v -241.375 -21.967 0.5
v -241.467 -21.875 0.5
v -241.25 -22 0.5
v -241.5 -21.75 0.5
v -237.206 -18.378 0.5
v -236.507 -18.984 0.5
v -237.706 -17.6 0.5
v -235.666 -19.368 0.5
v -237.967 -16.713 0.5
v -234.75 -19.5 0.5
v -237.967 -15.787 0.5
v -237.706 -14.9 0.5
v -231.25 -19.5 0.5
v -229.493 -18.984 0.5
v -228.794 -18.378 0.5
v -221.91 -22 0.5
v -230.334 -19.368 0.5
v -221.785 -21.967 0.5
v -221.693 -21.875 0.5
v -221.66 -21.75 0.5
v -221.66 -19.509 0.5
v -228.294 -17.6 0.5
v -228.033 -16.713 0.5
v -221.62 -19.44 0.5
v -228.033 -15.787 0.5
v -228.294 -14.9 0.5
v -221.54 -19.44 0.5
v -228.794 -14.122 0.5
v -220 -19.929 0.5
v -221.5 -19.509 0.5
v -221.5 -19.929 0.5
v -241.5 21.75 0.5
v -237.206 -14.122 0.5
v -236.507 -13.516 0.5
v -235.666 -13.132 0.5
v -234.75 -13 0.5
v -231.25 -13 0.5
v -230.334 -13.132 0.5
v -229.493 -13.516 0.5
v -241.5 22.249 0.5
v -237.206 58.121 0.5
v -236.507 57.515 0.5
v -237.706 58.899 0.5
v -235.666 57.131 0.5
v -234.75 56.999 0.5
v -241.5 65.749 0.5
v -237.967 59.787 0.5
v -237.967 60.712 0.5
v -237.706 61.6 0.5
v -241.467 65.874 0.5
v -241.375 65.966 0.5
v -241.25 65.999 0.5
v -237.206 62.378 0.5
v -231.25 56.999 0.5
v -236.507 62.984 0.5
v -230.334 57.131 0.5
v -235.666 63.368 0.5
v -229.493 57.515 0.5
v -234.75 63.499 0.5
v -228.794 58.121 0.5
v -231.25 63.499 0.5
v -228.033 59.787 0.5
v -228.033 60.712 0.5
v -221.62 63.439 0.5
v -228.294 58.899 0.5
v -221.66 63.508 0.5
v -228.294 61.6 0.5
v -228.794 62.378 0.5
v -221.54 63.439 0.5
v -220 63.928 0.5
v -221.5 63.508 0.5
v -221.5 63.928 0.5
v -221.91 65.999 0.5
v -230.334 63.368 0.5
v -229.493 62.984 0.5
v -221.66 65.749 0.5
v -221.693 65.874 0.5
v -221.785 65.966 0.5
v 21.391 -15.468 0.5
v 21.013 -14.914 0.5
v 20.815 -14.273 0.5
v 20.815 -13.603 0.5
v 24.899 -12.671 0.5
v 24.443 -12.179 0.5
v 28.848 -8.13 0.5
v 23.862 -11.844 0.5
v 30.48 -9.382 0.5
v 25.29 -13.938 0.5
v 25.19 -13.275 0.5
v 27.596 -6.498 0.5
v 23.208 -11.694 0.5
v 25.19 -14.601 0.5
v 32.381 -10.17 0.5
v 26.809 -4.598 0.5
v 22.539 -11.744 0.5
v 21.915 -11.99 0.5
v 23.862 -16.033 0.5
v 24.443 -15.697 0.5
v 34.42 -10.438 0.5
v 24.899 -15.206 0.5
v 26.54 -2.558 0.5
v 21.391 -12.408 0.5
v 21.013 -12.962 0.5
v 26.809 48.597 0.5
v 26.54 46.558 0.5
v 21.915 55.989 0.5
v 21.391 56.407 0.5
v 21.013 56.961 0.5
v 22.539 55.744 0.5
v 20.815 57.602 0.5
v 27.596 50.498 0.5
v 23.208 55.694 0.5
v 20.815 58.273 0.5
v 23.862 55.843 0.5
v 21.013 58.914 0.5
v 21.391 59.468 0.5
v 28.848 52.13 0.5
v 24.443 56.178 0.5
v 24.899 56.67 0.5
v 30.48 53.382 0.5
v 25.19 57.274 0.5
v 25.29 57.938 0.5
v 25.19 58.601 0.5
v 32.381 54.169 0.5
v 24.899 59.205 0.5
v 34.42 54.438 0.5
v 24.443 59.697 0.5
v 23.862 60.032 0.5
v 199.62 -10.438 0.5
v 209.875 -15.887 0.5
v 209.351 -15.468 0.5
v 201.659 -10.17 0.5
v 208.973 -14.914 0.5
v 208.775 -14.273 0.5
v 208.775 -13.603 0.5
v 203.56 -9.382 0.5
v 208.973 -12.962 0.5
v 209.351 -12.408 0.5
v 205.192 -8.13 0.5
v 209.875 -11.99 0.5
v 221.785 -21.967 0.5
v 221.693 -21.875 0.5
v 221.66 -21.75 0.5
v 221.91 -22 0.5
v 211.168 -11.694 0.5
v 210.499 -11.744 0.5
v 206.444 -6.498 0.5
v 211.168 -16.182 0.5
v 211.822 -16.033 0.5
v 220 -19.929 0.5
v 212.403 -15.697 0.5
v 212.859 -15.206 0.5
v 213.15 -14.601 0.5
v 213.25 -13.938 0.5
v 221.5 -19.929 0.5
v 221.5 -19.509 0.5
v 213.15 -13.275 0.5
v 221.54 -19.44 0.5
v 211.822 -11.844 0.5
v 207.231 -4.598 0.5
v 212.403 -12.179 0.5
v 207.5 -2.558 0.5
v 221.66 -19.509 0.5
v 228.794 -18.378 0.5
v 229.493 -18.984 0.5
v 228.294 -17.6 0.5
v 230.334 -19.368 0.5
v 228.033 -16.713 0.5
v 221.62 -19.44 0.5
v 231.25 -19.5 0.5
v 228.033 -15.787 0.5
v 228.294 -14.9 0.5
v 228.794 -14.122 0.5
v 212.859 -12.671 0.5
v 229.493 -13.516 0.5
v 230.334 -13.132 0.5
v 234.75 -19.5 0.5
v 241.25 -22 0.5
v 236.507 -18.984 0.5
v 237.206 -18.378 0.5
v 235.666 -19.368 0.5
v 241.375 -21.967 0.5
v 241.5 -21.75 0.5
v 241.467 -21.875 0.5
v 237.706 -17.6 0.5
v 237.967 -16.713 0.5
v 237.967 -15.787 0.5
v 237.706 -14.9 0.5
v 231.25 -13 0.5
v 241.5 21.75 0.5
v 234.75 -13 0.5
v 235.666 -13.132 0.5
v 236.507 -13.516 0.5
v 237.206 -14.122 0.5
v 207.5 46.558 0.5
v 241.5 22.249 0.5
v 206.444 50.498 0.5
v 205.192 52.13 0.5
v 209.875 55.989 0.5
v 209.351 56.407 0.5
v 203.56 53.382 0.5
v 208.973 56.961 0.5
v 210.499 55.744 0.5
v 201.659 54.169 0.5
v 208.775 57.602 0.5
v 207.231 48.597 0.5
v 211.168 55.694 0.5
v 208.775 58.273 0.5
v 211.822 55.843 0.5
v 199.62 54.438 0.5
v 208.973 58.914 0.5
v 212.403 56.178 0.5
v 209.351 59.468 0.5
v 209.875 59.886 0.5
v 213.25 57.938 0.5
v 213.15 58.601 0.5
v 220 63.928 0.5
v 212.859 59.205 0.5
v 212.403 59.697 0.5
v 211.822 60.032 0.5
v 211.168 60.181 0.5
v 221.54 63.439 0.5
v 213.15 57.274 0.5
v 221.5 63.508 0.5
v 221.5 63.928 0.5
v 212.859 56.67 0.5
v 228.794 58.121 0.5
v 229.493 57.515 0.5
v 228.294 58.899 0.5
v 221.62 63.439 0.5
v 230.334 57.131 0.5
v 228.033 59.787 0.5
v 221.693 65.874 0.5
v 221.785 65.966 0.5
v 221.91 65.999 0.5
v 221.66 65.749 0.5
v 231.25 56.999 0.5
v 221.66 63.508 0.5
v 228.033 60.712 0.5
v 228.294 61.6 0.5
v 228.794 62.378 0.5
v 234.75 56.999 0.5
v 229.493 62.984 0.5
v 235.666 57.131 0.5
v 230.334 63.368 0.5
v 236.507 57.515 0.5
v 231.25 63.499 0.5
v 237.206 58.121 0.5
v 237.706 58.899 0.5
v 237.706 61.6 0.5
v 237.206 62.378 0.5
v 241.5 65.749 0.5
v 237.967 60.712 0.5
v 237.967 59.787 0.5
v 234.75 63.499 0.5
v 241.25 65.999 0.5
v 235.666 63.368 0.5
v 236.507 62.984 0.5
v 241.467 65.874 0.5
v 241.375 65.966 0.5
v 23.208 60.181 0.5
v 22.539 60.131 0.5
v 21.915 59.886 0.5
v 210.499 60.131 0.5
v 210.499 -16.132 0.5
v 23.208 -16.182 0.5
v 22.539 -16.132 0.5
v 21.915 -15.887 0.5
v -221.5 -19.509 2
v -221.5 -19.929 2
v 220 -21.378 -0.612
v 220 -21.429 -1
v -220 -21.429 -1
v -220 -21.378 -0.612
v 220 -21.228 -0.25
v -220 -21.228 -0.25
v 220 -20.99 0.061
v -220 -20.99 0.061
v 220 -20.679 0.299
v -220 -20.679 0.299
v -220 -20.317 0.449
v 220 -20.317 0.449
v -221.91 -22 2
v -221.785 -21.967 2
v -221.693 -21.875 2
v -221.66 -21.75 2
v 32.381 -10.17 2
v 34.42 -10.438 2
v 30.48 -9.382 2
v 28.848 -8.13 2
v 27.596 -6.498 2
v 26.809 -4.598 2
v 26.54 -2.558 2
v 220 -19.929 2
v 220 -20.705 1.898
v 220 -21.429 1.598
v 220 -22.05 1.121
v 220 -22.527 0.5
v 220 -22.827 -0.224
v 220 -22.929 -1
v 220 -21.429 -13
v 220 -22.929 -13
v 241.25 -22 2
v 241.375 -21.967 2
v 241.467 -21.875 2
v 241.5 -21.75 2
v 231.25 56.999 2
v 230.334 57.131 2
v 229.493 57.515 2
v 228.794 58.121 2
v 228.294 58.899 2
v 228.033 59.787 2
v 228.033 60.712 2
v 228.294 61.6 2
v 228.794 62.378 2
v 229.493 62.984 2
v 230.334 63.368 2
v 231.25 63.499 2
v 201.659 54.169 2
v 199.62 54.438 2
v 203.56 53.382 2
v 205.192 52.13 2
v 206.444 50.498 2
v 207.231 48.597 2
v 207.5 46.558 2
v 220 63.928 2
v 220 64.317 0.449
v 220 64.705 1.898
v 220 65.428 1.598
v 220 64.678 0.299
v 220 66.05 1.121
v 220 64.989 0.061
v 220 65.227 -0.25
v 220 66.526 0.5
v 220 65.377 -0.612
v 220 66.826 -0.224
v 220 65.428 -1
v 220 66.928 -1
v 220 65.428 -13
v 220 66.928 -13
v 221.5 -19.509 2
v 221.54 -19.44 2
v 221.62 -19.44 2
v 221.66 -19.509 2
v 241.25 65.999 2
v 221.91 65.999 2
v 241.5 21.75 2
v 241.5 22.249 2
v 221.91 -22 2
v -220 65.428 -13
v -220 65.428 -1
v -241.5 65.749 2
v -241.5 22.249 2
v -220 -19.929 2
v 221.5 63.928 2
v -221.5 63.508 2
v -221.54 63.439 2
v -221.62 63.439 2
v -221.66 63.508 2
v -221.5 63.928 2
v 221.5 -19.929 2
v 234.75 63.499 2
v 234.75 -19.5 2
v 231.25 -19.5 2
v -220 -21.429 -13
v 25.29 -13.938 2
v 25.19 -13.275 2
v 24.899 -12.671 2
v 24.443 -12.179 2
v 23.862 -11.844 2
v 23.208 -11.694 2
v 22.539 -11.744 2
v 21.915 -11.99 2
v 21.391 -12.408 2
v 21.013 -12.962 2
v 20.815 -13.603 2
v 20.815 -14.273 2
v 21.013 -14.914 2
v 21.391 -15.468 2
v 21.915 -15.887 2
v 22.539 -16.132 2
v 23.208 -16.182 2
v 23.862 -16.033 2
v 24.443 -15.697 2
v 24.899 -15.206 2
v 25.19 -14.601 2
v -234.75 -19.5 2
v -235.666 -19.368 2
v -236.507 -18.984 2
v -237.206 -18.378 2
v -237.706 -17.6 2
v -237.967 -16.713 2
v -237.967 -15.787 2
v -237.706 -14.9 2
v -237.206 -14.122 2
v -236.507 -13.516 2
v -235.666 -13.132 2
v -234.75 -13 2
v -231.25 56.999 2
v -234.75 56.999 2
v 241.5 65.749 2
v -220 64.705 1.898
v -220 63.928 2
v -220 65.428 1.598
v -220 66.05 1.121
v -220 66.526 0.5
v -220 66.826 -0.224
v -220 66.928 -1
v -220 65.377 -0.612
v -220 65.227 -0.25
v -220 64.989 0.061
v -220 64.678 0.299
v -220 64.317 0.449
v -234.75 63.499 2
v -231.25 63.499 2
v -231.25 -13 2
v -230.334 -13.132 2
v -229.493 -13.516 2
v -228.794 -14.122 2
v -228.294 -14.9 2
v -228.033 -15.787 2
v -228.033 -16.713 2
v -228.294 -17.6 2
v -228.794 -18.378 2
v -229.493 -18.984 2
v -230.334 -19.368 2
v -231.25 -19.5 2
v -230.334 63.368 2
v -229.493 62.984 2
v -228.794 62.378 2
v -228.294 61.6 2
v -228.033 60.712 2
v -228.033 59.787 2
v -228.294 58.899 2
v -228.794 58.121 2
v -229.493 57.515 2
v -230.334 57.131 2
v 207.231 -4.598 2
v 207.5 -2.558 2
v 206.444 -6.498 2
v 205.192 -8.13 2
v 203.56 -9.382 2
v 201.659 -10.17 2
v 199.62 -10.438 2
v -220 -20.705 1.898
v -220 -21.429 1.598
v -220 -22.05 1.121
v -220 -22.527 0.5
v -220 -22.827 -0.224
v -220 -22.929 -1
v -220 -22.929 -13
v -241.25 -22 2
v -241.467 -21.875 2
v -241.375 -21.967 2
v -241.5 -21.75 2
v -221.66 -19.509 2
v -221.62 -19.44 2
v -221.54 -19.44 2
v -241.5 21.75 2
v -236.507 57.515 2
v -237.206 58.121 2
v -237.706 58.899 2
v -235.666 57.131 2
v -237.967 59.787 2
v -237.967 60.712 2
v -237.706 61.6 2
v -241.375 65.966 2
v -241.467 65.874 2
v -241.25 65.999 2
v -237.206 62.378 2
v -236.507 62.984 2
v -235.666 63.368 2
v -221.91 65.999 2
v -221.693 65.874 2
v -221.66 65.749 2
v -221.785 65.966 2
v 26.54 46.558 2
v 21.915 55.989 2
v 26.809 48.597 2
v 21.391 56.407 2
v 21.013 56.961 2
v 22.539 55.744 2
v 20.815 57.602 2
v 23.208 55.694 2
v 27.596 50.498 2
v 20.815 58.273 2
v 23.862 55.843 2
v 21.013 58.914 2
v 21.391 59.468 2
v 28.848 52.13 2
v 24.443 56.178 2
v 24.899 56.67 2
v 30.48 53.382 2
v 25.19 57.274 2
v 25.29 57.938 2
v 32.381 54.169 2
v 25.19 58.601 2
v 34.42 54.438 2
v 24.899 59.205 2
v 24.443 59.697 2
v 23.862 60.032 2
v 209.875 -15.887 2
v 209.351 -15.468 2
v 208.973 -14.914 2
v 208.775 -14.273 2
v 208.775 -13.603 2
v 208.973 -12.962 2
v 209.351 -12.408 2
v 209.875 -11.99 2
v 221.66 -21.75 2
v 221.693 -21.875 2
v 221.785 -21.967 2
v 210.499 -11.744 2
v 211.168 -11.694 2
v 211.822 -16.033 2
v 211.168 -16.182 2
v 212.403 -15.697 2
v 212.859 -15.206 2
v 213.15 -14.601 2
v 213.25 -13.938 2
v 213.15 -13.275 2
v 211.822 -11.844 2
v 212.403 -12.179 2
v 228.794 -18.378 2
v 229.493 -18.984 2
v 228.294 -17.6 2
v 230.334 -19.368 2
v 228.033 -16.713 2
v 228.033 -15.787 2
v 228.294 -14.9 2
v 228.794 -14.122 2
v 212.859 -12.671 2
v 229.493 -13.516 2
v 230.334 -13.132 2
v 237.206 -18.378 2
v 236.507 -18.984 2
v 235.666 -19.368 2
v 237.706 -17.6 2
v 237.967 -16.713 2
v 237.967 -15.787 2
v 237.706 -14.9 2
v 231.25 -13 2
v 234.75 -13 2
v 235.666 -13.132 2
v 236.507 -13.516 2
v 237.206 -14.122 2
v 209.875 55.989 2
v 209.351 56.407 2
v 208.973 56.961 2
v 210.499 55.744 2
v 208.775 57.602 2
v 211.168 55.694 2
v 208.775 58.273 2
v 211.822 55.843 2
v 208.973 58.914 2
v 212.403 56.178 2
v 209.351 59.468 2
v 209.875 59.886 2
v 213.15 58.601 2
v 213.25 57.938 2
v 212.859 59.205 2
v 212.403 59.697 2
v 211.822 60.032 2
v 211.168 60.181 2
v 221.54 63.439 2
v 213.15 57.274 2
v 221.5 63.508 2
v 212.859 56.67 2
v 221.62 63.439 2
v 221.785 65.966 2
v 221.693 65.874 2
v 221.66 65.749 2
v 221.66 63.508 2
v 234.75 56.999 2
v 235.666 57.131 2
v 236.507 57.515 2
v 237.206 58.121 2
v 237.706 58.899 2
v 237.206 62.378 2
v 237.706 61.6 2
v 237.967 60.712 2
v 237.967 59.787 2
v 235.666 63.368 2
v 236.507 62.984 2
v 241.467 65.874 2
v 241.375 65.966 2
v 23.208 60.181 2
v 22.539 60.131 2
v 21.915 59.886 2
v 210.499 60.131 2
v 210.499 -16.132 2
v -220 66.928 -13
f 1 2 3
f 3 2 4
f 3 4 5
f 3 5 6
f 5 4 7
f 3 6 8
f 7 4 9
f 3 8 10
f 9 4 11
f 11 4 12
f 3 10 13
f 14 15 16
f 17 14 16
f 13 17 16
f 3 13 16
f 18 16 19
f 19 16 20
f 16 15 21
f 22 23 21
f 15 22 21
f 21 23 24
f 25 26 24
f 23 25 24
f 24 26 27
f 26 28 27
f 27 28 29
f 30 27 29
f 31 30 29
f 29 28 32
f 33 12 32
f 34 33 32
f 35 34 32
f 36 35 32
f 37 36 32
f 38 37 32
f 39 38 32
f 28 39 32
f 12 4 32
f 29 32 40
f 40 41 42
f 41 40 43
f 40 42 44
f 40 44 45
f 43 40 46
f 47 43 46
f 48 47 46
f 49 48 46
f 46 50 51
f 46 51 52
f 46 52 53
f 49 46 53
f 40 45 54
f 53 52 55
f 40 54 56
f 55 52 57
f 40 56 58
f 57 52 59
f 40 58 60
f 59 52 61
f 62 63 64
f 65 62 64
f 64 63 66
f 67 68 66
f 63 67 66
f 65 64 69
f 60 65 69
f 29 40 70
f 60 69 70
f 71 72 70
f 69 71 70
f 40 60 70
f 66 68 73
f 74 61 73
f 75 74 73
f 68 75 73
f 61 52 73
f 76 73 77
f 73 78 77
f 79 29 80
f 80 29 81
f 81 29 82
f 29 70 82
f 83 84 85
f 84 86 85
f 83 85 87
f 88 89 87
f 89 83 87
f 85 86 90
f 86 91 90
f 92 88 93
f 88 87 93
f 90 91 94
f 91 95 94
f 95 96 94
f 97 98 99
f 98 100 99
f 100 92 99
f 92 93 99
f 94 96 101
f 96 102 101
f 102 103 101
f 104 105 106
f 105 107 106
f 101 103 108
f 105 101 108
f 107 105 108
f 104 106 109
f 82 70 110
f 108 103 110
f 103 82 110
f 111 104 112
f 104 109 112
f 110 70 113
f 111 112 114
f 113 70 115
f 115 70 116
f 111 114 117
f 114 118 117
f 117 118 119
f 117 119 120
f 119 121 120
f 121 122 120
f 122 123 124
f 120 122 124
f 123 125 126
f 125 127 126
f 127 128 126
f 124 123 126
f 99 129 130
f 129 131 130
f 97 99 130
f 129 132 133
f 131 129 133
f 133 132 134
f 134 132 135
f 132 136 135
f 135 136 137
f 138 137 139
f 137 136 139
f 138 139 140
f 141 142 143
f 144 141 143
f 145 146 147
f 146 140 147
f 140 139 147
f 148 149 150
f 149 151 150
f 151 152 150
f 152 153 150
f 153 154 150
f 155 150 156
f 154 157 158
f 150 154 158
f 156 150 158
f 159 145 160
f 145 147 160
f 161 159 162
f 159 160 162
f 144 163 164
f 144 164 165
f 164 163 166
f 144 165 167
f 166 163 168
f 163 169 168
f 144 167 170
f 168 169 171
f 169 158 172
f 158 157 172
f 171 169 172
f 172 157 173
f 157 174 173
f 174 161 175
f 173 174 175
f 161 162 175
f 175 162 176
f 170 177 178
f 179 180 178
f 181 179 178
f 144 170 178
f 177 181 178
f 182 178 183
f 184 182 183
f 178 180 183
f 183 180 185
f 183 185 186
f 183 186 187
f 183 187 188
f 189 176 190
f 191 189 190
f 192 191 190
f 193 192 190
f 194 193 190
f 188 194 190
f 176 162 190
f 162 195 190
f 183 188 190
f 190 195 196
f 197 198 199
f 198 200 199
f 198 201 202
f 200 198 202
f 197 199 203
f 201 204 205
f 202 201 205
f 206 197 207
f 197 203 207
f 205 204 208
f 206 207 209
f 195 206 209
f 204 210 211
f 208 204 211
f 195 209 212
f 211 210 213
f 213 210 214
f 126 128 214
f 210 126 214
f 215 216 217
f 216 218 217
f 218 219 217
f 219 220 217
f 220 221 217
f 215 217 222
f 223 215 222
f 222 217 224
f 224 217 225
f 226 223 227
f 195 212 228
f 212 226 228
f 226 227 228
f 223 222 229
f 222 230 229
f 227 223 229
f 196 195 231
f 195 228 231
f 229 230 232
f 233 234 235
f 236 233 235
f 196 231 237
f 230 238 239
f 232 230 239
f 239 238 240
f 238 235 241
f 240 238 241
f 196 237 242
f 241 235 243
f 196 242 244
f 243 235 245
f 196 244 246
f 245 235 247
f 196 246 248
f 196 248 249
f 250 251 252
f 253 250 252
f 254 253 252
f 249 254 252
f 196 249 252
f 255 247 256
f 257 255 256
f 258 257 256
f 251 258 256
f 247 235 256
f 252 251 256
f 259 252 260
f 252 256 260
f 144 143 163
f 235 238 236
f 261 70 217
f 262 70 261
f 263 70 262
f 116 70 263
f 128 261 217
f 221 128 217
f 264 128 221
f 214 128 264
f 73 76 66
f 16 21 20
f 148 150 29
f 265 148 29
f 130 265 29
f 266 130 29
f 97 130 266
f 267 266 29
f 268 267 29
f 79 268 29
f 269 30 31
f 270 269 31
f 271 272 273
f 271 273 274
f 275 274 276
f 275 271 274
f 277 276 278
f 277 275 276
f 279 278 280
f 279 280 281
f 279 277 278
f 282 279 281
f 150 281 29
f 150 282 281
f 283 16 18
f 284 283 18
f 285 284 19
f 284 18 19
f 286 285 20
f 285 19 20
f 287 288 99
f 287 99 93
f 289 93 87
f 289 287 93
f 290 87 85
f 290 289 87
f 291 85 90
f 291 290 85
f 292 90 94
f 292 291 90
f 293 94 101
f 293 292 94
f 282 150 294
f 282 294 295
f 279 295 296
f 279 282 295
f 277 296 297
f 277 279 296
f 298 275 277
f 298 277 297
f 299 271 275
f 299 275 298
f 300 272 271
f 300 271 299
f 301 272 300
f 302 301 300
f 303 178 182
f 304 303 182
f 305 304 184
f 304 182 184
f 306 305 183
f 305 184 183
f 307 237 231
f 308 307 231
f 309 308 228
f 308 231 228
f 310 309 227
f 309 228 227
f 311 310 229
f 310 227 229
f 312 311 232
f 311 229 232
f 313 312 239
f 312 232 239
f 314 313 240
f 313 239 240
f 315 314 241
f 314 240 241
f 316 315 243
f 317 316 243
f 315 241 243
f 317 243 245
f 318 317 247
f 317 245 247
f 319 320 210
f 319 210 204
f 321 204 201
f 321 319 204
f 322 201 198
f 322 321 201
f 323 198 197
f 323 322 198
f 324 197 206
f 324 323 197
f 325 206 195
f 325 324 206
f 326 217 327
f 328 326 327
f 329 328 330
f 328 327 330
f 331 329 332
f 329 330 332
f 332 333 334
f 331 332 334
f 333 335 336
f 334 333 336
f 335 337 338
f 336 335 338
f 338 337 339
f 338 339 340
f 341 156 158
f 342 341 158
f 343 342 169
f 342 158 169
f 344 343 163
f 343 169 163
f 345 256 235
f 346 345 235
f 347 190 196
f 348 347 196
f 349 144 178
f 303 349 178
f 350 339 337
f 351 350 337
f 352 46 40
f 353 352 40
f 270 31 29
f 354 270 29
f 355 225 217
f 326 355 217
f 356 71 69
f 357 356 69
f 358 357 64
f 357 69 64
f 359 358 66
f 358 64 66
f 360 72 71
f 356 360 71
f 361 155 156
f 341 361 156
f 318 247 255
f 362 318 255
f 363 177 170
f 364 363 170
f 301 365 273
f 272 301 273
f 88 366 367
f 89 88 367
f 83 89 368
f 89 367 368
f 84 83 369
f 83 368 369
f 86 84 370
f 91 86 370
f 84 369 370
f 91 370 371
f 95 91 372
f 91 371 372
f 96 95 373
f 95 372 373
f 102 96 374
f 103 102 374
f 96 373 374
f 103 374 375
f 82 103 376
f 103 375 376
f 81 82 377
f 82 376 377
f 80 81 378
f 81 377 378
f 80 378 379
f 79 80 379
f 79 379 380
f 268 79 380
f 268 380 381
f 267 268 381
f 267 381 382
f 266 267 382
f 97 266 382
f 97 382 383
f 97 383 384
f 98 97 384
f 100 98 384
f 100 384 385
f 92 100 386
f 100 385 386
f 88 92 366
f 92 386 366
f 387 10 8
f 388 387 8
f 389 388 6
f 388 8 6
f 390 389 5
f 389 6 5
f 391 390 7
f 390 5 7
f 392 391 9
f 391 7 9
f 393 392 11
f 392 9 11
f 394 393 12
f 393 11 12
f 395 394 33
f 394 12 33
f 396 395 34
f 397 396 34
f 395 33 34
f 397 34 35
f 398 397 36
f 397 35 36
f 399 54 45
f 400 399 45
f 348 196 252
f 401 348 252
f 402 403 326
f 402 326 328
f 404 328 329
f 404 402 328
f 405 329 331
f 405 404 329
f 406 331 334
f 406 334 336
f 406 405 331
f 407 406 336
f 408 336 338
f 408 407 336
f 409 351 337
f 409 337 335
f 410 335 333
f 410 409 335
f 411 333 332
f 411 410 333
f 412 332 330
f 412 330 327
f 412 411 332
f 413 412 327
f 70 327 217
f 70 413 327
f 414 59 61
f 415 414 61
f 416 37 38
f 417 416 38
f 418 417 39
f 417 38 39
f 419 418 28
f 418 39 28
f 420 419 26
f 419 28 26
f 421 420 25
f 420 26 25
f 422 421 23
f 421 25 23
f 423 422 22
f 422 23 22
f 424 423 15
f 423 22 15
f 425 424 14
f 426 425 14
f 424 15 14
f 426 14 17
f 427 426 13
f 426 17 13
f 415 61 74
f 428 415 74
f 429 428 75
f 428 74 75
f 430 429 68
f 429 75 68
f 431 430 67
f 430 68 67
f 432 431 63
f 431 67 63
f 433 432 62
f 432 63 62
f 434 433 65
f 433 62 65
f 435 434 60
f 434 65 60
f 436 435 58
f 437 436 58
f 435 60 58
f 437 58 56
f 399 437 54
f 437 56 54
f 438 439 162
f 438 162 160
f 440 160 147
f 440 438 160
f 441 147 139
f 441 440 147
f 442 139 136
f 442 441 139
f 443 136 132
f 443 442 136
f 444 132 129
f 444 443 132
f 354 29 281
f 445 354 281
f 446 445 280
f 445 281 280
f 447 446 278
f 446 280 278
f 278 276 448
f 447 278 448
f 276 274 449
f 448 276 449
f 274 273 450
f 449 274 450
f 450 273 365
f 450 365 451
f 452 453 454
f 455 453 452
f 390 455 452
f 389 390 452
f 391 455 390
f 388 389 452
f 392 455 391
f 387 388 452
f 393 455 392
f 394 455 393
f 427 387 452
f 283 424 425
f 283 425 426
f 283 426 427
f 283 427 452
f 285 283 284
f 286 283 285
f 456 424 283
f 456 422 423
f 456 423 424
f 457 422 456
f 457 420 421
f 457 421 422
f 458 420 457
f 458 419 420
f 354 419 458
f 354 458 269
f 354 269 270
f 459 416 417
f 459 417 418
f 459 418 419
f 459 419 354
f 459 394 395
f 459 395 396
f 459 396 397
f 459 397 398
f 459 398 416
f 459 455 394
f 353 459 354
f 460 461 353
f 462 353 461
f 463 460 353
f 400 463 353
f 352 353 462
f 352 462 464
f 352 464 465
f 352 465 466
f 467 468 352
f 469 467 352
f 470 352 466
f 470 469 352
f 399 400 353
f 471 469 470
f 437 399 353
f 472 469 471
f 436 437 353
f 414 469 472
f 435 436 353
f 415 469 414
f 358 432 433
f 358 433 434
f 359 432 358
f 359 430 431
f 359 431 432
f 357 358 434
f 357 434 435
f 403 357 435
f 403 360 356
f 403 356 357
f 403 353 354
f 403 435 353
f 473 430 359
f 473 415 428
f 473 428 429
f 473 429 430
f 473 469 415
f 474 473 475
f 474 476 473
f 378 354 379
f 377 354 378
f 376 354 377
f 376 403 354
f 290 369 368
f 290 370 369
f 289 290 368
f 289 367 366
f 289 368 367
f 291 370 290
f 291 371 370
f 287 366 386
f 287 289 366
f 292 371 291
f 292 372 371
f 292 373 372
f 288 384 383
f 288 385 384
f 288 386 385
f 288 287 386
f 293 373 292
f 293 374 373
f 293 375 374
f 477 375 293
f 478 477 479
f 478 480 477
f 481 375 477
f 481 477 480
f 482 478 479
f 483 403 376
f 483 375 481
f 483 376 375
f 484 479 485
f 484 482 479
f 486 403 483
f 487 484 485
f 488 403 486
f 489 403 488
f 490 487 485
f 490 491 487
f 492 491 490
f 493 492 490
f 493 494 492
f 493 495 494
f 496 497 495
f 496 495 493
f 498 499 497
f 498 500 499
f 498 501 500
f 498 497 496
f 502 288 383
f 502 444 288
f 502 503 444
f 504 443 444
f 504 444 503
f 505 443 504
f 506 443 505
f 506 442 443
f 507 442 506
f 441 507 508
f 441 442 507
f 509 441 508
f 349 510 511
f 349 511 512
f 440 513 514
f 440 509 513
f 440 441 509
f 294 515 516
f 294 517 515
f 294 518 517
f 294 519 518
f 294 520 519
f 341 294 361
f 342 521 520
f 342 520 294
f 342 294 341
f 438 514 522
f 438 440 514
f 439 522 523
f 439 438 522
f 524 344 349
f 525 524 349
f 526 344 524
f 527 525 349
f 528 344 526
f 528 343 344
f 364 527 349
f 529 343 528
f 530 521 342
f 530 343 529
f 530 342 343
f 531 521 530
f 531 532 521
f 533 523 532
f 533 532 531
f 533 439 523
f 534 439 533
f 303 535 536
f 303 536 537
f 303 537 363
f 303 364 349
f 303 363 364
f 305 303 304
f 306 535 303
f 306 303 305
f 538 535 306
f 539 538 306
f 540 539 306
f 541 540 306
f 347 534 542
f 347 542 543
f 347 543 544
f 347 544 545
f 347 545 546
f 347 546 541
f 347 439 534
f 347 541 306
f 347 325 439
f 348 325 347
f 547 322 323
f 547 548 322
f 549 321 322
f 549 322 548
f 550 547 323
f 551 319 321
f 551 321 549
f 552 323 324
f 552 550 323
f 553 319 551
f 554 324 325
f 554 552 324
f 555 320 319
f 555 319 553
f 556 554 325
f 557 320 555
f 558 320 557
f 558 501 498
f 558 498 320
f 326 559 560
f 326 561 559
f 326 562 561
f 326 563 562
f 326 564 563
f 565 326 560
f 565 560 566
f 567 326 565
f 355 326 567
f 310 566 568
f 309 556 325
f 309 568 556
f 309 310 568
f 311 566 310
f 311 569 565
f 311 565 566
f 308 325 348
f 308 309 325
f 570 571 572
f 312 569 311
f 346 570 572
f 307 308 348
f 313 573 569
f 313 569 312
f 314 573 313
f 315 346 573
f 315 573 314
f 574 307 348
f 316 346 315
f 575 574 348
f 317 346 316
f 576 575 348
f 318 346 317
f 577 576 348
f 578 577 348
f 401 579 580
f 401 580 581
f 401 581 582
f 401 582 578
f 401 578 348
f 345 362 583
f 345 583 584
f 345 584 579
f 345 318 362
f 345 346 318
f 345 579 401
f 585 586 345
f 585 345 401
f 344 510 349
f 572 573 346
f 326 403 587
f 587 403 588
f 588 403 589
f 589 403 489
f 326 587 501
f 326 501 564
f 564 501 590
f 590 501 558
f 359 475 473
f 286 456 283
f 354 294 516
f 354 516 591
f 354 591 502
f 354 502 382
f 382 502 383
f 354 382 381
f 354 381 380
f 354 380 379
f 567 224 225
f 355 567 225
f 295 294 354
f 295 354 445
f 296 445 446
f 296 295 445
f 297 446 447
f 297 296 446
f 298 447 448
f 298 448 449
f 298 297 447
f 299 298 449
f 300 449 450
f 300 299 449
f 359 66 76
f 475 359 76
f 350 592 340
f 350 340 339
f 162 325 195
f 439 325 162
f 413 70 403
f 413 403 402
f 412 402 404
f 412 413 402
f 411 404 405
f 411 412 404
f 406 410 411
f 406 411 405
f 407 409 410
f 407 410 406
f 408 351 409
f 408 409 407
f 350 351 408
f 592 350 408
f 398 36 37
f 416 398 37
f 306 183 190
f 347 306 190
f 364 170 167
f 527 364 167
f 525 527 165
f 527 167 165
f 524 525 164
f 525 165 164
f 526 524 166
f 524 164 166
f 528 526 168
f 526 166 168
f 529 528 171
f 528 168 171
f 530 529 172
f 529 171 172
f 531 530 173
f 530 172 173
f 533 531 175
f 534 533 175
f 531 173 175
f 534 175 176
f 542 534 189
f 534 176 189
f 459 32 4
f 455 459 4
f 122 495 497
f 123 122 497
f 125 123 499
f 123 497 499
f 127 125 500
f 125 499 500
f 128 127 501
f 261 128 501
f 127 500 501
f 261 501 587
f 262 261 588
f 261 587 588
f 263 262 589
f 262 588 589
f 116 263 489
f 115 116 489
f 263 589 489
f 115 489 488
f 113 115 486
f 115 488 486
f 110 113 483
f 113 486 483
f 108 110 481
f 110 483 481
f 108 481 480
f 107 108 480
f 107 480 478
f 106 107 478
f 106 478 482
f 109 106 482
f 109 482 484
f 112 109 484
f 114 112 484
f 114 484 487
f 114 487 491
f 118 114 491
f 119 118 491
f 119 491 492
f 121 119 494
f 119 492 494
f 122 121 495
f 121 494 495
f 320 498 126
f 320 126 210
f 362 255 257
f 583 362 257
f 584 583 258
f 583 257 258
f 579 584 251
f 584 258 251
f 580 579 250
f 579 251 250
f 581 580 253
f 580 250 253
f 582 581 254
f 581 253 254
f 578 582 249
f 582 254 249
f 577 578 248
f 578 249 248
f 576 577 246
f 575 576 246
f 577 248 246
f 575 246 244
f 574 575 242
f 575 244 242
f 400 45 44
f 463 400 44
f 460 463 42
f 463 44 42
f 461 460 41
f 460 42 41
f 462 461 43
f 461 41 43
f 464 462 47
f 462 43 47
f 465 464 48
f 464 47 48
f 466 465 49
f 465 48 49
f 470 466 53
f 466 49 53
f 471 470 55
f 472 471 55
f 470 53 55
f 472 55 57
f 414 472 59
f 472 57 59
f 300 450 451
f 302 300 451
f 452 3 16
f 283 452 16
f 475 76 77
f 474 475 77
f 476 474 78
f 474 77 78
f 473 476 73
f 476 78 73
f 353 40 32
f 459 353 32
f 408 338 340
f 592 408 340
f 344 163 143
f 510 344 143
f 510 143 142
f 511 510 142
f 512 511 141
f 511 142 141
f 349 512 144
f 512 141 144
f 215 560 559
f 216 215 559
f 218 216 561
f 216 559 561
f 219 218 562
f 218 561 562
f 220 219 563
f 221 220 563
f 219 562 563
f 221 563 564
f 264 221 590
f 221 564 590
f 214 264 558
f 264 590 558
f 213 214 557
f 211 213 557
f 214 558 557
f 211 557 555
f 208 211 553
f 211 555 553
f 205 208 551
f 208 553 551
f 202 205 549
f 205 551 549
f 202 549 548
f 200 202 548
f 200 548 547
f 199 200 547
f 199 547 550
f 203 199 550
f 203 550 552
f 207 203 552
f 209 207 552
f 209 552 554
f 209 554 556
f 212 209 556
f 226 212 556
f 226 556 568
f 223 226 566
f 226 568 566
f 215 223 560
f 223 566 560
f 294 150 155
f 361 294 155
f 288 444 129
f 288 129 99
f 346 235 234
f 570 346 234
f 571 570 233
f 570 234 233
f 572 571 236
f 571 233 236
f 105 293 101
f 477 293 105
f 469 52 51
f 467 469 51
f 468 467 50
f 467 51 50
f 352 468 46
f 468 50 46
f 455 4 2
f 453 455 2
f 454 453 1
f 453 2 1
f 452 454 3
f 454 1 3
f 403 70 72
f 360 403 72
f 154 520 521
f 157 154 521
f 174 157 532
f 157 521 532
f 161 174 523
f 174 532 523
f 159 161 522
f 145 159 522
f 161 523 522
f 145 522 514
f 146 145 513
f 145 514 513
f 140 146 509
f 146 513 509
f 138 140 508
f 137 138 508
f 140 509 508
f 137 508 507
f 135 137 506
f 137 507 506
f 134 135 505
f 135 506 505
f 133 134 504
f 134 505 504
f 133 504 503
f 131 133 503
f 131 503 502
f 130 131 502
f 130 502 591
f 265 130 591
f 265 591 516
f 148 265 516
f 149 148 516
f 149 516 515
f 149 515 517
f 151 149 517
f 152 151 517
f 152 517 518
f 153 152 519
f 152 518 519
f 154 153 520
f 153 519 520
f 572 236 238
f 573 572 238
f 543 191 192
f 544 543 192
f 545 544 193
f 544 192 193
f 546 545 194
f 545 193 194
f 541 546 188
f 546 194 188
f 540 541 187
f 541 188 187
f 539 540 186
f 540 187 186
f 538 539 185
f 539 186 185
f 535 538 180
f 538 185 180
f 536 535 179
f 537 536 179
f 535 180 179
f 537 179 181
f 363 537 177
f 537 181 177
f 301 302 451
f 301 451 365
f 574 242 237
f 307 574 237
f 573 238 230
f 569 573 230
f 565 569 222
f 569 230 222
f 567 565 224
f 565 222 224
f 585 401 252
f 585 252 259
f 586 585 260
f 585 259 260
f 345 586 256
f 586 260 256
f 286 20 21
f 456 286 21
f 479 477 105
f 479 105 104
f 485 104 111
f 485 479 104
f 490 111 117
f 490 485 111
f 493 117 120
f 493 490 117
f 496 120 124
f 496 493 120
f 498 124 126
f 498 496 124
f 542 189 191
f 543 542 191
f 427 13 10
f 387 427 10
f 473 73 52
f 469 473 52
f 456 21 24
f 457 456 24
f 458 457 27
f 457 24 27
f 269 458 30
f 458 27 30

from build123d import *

# Parameters (mm, degrees)
BOSS_EXTRUDE1_DEPTH     = 2
CONVERT_SOLID1_DEPTH    = 0.5
EDGE_FLANGE1_DEPTH      = 440
EDGE_FLANGE1_BEND_DEPTH = 440
SKETCH12_R              = 2.25
CUT_EXTRUDE1_DEPTH      = 1.5


# Read off the part's stored shape, not the designer's step: Convert-Solid1
# Sheet-metal steps are written as plain solids
with BuildPart() as part:
    # Model → Boss-Extrude1 (new body)
    with BuildSketch(Plane.XY):
        with BuildLine():
            Line((221.66, -19.508939372), (221.66, -21.75))
            ThreePointArc((221.66, -21.75), (221.733223305, -21.926776695), (221.91, -22))
            Line((221.91, -22), (241.25, -22))
            ThreePointArc((241.25, -22), (241.426776695, -21.926776695), (241.5, -21.75))
            Line((241.5, -21.75), (241.5, 21.75))
            Line((241.5, 21.75), (241.500000169, 22.249478564))
            Line((241.500000169, 22.249478564), (241.500000169, 65.749478564))
            ThreePointArc((241.500000169, 65.749478564), (241.426776865, 65.926255259), (241.250000169, 65.999478564))
            Line((241.250000169, 65.999478564), (221.910000169, 65.999478564))
            ThreePointArc((221.910000169, 65.999478564), (221.733223474, 65.926255259), (221.660000169, 65.749478564))
            Line((221.660000169, 65.749478564), (221.660000169, 63.508417937))
            ThreePointArc((221.660000169, 63.508417937), (221.580000169, 63.428417937), (221.500000169, 63.508417937))
            Line((221.500000169, 63.508417937), (221.500000169, 63.928417937))
            Line((221.500000169, 63.928417937), (-221.499999831, 63.928417937))
            Line((-221.499999831, 63.928417937), (-221.499999831, 63.508417937))
            ThreePointArc((-221.499999831, 63.508417937), (-221.579999831, 63.428417937), (-221.659999831, 63.508417937))
            Line((-221.659999831, 63.508417937), (-221.659999831, 65.749478564))
            ThreePointArc((-221.659999831, 65.749478564), (-221.733223135, 65.926255259), (-221.909999831, 65.999478564))
            Line((-221.909999831, 65.999478564), (-241.249999831, 65.999478564))
            ThreePointArc((-241.249999831, 65.999478564), (-241.426776526, 65.926255259), (-241.499999831, 65.749478564))
            Line((-241.499999831, 65.749478564), (-241.499999831, 22.249478564))
            Line((-241.499999831, 22.249478564), (-241.5, 21.75))
            Line((-241.5, 21.75), (-241.5, -21.75))
            ThreePointArc((-241.5, -21.75), (-241.426776695, -21.926776695), (-241.25, -22))
            Line((-241.25, -22), (-221.91, -22))
            ThreePointArc((-221.91, -22), (-221.733223305, -21.926776695), (-221.66, -21.75))
            Line((-221.66, -21.75), (-221.66, -19.508939372))
            ThreePointArc((-221.66, -19.508939372), (-221.58, -19.428939372), (-221.5, -19.508939372))
            Line((-221.5, -19.508939372), (-221.5, -19.928939372))
            Line((-221.5, -19.928939372), (221.5, -19.928939372))
            Line((221.5, -19.928939372), (221.5, -19.508939372))
            ThreePointArc((221.5, -19.508939372), (221.58, -19.428939372), (221.66, -19.508939372))
        make_face()
        with BuildLine():
            Line((-231.25, -19.5), (-234.75, -19.5))
            ThreePointArc((-234.75, -19.5), (-238, -16.25), (-234.75, -13))
            Line((-234.75, -13), (-231.25, -13))
            ThreePointArc((-231.25, -13), (-228, -16.25), (-231.25, -19.5))
        make_face(mode=Mode.SUBTRACT)
        with BuildLine():
            Line((231.25, -13), (234.75, -13))
            ThreePointArc((234.75, -13), (238, -16.25), (234.75, -19.5))
            Line((234.75, -19.5), (231.25, -19.5))
            ThreePointArc((231.25, -19.5), (228, -16.25), (231.25, -13))
        make_face(mode=Mode.SUBTRACT)
        with BuildLine():
            Line((-231.249999831, 56.999478564), (-234.749999831, 56.999478564))
            ThreePointArc((-234.749999831, 56.999478564), (-237.999999831, 60.249478564), (-234.749999831, 63.499478564))
            Line((-234.749999831, 63.499478564), (-231.249999831, 63.499478564))
            ThreePointArc((-231.249999831, 63.499478564), (-227.999999831, 60.249478564), (-231.249999831, 56.999478564))
        make_face(mode=Mode.SUBTRACT)
        with BuildLine():
            Line((234.750000169, 56.999478564), (231.250000169, 56.999478564))
            ThreePointArc((231.250000169, 56.999478564), (228.000000169, 60.249478564), (231.250000169, 63.499478564))
            Line((231.250000169, 63.499478564), (234.750000169, 63.499478564))
            ThreePointArc((234.750000169, 63.499478564), (238.000000169, 60.249478564), (234.750000169, 56.999478564))
        make_face(mode=Mode.SUBTRACT)
    extrude(amount=BOSS_EXTRUDE1_DEPTH)

    # Convert-Solid1 outline → Convert-Solid1 (cut)
    with BuildSketch(Plane.XY):
        with BuildLine():
            Line((221.5, -19.928939372), (221.5, -19.508939372))
            ThreePointArc((221.5, -19.508939372), (221.58, -19.428939372), (221.66, -19.508939372))
            Line((221.66, -19.508939372), (221.66, -21.75))
            ThreePointArc((221.66, -21.75), (221.733223305, -21.926776695), (221.91, -22))
            Line((221.91, -22), (241.25, -22))
            ThreePointArc((241.25, -22), (241.426776695, -21.926776695), (241.5, -21.75))
            Line((241.5, -21.75), (241.5, 21.75))
            Line((241.5, 21.75), (241.500000169, 65.749478564))
            ThreePointArc((241.500000169, 65.749478564), (241.426776864, 65.926255259), (241.250000169, 65.999478564))
            Line((241.250000169, 65.999478564), (221.910000169, 65.999478564))
            ThreePointArc((221.910000169, 65.999478564), (221.733223474, 65.926255259), (221.660000169, 65.749478564))
            Line((221.660000169, 65.749478564), (221.660000169, 63.508417937))
            ThreePointArc((221.660000169, 63.508417937), (221.580000169, 63.428417937), (221.500000169, 63.508417937))
            Line((221.500000169, 63.508417937), (221.500000169, 63.928417937))
            Line((221.500000169, 63.928417937), (-221.499999831, 63.928417937))
            Line((-221.499999831, 63.928417937), (-221.499999831, 63.508417937))
            ThreePointArc((-221.499999831, 63.508417937), (-221.579999831, 63.428417937), (-221.659999831, 63.508417937))
            Line((-221.659999831, 63.508417937), (-221.659999831, 65.749478564))
            ThreePointArc((-221.659999831, 65.749478564), (-221.733223135, 65.926255259), (-221.909999831, 65.999478564))
            Line((-221.909999831, 65.999478564), (-241.249999831, 65.999478564))
            ThreePointArc((-241.249999831, 65.999478564), (-241.426776526, 65.926255259), (-241.499999831, 65.749478564))
            Line((-241.499999831, 65.749478564), (-241.499999831, 22.249478564))
            Line((-241.499999831, 22.249478564), (-241.5, -21.75))
            ThreePointArc((-241.5, -21.75), (-241.426776695, -21.926776695), (-241.25, -22))
            Line((-241.25, -22), (-221.91, -22))
            ThreePointArc((-221.91, -22), (-221.733223305, -21.926776695), (-221.66, -21.75))
            Line((-221.66, -21.75), (-221.66, -19.508939372))
            ThreePointArc((-221.66, -19.508939372), (-221.58, -19.428939372), (-221.5, -19.508939372))
            Line((-221.5, -19.508939372), (-221.5, -19.928939372))
            Line((-221.5, -19.928939372), (221.5, -19.928939372))
        make_face()
        with BuildLine():
            Line((-234.75, -13), (-231.25, -13))
            ThreePointArc((-231.25, -13), (-228, -16.25), (-231.25, -19.5))
            Line((-231.25, -19.5), (-234.75, -19.5))
            ThreePointArc((-234.75, -19.5), (-238, -16.25), (-234.75, -13))
        make_face(mode=Mode.SUBTRACT)
        with BuildLine():
            ThreePointArc((231.25, -19.5), (228, -16.25), (231.25, -13))
            Line((231.25, -13), (234.75, -13))
            ThreePointArc((234.75, -13), (238, -16.25), (234.75, -19.5))
            Line((234.75, -19.5), (231.25, -19.5))
        make_face(mode=Mode.SUBTRACT)
        with BuildLine():
            Line((-234.749999831, 63.499478564), (-231.249999831, 63.499478564))
            ThreePointArc((-231.249999831, 63.499478564), (-227.999999831, 60.249478564), (-231.249999831, 56.999478564))
            Line((-231.249999831, 56.999478564), (-234.749999831, 56.999478564))
            ThreePointArc((-234.749999831, 56.999478564), (-237.999999831, 60.249478564), (-234.749999831, 63.499478564))
        make_face(mode=Mode.SUBTRACT)
        with BuildLine():
            ThreePointArc((231.250000169, 56.999478564), (228.000000169, 60.249478564), (231.250000169, 63.499478564))
            Line((231.250000169, 63.499478564), (234.750000169, 63.499478564))
            ThreePointArc((234.750000169, 63.499478564), (238.000000169, 60.249478564), (234.750000169, 56.999478564))
            Line((234.750000169, 56.999478564), (231.250000169, 56.999478564))
        make_face(mode=Mode.SUBTRACT)
    extrude(amount=CONVERT_SOLID1_DEPTH, mode=Mode.SUBTRACT)

    # Edge-Flange1 section (across the edge) → Edge-Flange1 (add)
    with BuildSketch(Plane(origin=(-219.999999831, 65.428417937, 0.5), x_dir=(0, -1, 0), z_dir=(1, 0, 0))):
        with BuildLine():
            Line((-1.5, 1.5), (-1.5, 13.5))
            Line((-1.5, 13.5), (0, 13.5))
            Line((0, 13.5), (0, 1.5))
            ThreePointArc((0, 1.5), (0.439339828, 0.439339828), (1.5, 0))
            Line((1.5, 0), (1.5, -1.5))
            ThreePointArc((1.5, -1.5), (-0.621320344, -0.621320344), (-1.5, 1.5))
        make_face()
    extrude(amount=EDGE_FLANGE1_DEPTH)

    # Edge-Flange1 section 2 (across the edge) → Edge-Flange1 bend (add)
    with BuildSketch(Plane(origin=(220, -21.428939372, 0.5), x_dir=(0, 1, 0), z_dir=(-1, 0, 0))):
        with BuildLine():
            Line((-1.5, 1.5), (-1.5, 13.5))
            Line((-1.5, 13.5), (0, 13.5))
            Line((0, 13.5), (0, 1.5))
            ThreePointArc((0, 1.5), (0.439339828, 0.439339828), (1.5, 0))
            Line((1.5, 0), (1.5, -1.5))
            ThreePointArc((1.5, -1.5), (-0.621320344, -0.621320344), (-1.5, 1.5))
        make_face()
    extrude(amount=EDGE_FLANGE1_BEND_DEPTH)

    # Sketch12 → Cut-Extrude1 (cut)
    with BuildSketch(Plane.XY.offset(2)):
        with Locations((211.000000169, 57.937539282)):
            Circle(SKETCH12_R)
        with Locations((23.040000169, 57.937539282)):
            Circle(SKETCH12_R)
        with Locations((23.040000169, -13.938060718)):
            Circle(SKETCH12_R)
        with Locations((211.000000169, -13.938060718)):
            Circle(SKETCH12_R)
        with BuildLine():
            Line((34.420000169, 54.437539282), (199.620000169, 54.437539282))
            ThreePointArc((199.620000169, 54.437539282), (205.192001605, 52.129540718), (207.500000169, 46.557539282))
            Line((207.500000169, 46.557539282), (207.500000169, -2.558060718))
            ThreePointArc((207.500000169, -2.558060718), (205.192001605, -8.130062154), (199.620000169, -10.438060718))
            Line((199.620000169, -10.438060718), (34.420000169, -10.438060718))
            ThreePointArc((34.420000169, -10.438060718), (28.847998734, -8.130062154), (26.540000169, -2.558060718))
            Line((26.540000169, -2.558060718), (26.540000169, 46.557539282))
            ThreePointArc((26.540000169, 46.557539282), (28.847998734, 52.129540718), (34.420000169, 54.437539282))
        make_face()
    extrude(amount=-CUT_EXTRUDE1_DEPTH, mode=Mode.SUBTRACT)


solid = part.part
